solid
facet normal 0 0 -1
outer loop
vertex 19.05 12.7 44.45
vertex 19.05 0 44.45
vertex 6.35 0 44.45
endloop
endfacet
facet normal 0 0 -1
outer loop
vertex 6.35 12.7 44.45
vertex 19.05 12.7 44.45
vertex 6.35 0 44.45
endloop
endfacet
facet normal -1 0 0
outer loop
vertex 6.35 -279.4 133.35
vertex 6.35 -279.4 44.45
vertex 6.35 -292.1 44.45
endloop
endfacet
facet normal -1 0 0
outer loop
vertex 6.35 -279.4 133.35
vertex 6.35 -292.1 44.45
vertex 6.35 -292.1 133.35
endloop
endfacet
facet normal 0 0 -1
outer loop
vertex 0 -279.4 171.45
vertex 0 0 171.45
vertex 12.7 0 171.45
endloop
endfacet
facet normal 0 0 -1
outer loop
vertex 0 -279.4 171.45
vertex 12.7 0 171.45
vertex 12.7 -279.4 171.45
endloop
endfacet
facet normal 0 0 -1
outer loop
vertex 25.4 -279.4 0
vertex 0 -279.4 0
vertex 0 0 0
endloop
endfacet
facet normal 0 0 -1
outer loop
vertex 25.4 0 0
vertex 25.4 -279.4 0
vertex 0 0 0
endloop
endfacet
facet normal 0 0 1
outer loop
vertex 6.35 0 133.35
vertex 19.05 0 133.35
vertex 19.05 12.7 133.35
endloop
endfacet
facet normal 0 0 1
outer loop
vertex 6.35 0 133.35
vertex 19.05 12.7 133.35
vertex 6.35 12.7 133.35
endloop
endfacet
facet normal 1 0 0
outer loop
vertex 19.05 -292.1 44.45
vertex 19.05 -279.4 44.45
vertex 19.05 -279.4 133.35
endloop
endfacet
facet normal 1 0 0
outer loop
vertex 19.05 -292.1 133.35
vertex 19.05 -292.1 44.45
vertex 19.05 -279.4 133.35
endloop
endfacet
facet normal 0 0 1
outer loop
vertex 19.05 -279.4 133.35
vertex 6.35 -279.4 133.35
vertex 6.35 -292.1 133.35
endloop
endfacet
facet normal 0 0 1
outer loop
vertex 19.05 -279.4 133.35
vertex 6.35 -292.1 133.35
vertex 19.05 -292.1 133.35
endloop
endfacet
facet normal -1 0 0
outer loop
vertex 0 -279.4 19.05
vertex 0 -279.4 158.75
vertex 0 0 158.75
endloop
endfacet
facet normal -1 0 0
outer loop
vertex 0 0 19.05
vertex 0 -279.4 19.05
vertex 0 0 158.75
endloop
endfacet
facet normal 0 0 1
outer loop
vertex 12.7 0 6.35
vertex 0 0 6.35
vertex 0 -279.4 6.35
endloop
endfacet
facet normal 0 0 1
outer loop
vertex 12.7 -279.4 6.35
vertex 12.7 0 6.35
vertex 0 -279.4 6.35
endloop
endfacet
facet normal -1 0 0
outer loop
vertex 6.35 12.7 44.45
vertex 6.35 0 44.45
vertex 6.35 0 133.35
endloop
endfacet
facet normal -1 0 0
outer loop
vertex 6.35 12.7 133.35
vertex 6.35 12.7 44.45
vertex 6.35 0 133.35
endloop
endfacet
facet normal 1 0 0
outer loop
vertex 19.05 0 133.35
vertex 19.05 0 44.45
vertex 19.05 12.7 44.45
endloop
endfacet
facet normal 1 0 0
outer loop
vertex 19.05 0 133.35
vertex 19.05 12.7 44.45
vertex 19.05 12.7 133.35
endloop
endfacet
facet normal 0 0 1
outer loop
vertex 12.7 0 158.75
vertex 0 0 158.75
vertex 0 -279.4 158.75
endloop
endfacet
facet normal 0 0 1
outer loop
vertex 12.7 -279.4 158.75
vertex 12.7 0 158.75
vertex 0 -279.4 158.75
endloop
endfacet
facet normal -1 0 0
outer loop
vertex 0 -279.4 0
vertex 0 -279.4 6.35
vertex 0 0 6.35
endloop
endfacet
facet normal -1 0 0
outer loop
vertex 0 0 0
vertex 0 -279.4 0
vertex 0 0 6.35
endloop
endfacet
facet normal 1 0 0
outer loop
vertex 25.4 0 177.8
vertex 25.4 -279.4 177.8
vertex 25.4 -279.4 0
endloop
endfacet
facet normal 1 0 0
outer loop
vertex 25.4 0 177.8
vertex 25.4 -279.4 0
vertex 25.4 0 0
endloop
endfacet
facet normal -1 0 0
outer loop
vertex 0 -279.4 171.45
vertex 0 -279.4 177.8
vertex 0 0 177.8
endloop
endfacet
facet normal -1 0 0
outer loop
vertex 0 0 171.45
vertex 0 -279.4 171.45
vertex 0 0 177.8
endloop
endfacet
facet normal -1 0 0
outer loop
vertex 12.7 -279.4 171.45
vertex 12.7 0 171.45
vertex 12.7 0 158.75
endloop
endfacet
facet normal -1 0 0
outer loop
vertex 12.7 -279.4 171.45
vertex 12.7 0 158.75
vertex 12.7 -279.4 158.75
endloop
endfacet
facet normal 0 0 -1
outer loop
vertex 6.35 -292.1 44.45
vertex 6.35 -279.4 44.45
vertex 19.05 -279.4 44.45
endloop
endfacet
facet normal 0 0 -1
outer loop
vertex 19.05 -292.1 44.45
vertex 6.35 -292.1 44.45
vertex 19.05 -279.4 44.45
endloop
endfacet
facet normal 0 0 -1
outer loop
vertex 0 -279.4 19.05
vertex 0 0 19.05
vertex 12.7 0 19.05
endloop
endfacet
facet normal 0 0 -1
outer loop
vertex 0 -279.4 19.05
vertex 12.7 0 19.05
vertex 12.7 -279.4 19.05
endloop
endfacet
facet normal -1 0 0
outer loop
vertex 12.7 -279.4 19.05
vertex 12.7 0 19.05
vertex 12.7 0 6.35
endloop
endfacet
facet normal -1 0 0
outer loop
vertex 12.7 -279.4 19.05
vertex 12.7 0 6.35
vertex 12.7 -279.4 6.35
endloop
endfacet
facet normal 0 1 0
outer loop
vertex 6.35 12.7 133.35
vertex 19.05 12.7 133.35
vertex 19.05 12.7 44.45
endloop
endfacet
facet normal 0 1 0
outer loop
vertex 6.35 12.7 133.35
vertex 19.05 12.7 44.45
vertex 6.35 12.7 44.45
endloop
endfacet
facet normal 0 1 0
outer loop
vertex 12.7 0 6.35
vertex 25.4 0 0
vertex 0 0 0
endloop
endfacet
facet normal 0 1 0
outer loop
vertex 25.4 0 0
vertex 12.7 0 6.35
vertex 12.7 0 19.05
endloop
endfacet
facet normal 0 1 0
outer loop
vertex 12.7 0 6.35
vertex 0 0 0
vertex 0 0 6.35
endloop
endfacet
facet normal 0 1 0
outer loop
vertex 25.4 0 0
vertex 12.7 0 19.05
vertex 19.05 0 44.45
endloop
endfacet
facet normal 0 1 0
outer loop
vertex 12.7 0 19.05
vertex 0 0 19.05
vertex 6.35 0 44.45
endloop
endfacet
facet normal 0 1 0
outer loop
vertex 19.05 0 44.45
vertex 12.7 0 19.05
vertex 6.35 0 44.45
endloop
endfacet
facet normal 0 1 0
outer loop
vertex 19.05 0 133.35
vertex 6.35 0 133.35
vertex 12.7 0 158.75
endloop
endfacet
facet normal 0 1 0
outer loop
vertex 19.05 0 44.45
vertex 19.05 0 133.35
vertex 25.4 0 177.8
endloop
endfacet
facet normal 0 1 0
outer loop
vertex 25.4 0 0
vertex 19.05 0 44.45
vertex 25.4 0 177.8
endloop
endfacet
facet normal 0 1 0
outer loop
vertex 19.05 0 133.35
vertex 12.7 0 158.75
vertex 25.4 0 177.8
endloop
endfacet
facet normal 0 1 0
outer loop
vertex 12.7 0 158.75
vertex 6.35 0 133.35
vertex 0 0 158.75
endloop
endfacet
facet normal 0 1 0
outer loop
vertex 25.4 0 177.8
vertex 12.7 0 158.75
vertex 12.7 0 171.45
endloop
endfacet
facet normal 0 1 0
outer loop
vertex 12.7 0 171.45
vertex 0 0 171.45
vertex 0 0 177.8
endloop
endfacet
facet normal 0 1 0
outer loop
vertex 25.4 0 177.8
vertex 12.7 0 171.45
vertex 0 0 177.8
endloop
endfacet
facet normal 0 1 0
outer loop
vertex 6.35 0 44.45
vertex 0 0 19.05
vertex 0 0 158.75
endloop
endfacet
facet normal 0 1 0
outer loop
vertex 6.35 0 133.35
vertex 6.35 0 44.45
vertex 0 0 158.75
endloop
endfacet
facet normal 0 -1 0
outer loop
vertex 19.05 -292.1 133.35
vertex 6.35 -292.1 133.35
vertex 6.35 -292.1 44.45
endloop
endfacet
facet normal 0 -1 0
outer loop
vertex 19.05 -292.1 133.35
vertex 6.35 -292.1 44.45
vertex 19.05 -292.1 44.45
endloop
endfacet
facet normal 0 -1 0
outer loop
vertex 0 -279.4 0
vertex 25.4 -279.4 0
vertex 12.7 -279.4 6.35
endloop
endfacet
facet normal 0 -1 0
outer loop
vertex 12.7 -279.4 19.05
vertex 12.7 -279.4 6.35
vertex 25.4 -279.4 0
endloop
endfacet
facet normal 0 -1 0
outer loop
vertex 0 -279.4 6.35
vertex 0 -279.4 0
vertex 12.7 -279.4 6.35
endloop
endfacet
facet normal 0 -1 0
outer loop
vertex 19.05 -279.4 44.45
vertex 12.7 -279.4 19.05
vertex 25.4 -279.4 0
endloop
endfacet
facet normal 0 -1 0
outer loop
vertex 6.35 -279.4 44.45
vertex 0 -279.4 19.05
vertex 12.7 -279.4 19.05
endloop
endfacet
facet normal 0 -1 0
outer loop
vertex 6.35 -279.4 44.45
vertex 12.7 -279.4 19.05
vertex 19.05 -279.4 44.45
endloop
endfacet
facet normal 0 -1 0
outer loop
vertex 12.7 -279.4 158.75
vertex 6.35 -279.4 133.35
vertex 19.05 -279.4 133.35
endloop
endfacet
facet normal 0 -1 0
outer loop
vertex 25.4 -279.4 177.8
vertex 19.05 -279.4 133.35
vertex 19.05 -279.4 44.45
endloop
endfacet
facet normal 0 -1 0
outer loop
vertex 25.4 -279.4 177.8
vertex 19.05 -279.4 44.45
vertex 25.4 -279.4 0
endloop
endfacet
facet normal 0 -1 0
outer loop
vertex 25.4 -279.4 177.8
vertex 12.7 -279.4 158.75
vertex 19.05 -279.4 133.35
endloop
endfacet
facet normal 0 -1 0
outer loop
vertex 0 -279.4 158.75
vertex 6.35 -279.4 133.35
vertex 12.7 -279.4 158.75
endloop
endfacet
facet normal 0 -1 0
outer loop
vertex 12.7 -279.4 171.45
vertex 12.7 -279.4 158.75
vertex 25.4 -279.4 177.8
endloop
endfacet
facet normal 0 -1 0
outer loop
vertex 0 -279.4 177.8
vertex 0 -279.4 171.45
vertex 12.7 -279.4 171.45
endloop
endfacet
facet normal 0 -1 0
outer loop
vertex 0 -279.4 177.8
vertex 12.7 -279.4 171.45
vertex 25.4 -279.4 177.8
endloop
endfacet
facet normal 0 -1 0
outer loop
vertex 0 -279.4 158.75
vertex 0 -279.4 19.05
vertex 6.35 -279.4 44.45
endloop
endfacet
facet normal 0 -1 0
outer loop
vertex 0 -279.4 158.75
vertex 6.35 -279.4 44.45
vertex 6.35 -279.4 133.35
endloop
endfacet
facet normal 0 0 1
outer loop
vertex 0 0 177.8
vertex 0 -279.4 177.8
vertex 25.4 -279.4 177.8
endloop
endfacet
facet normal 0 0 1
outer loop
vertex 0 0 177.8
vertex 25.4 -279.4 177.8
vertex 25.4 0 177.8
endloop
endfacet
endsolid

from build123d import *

# Parameters (mm, degrees)
F0_W     = 279.4
F0_H     = 177.8
F1_DEPTH = 25.4
F2_W     = 279.4
F2_H     = 12.7
F3_DEPTH = 12.7
F4_W     = 279.4
F4_H     = 12.7
F5_DEPTH = 12.7
F6_W     = 12.7
F6_H     = 88.9
F7_DEPTH = 12.7
F8_W     = 12.7
F8_H     = 88.9
F9_DEPTH = 12.7


with BuildPart() as f1:
    # F0 (on Right) → F1 (new body)
    with BuildSketch(Plane.YZ):
        with Locations((-139.7, 88.9)):
            Rectangle(F0_W, F0_H)
    extrude(amount=F1_DEPTH)

    # F2 (on face) → F3 (cut)
    with BuildSketch(Plane(origin=(0, 0, 0), x_dir=(0, -1, 0), z_dir=(-1, 0, 0))):
        with Locations((139.7, 12.7)):
            Rectangle(F2_W, F2_H)
    extrude(amount=-F3_DEPTH, mode=Mode.SUBTRACT)

    # F4 (on face) → F5 (cut)
    with BuildSketch(Plane(origin=(0, 0, 0), x_dir=(0, -1, 0), z_dir=(-1, 0, 0))):
        with Locations((139.7, 165.1)):
            Rectangle(F4_W, F4_H)
    extrude(amount=-F5_DEPTH, mode=Mode.SUBTRACT)

    # F6 (on face) → F7 (join)
    with BuildSketch(Plane(origin=(0, 0, 0), x_dir=(-1, 0, 0), z_dir=(0, 1, 0))):
        with Locations((-12.7, 88.9)):
            Rectangle(F6_W, F6_H)
    extrude(amount=F7_DEPTH)

    # F8 (on face) → F9 (join)
    with BuildSketch(Plane.XZ.offset(279.4)):
        with Locations((12.7, 88.9)):
            Rectangle(F8_W, F8_H)
    extrude(amount=F9_DEPTH)


solid = f1.part
